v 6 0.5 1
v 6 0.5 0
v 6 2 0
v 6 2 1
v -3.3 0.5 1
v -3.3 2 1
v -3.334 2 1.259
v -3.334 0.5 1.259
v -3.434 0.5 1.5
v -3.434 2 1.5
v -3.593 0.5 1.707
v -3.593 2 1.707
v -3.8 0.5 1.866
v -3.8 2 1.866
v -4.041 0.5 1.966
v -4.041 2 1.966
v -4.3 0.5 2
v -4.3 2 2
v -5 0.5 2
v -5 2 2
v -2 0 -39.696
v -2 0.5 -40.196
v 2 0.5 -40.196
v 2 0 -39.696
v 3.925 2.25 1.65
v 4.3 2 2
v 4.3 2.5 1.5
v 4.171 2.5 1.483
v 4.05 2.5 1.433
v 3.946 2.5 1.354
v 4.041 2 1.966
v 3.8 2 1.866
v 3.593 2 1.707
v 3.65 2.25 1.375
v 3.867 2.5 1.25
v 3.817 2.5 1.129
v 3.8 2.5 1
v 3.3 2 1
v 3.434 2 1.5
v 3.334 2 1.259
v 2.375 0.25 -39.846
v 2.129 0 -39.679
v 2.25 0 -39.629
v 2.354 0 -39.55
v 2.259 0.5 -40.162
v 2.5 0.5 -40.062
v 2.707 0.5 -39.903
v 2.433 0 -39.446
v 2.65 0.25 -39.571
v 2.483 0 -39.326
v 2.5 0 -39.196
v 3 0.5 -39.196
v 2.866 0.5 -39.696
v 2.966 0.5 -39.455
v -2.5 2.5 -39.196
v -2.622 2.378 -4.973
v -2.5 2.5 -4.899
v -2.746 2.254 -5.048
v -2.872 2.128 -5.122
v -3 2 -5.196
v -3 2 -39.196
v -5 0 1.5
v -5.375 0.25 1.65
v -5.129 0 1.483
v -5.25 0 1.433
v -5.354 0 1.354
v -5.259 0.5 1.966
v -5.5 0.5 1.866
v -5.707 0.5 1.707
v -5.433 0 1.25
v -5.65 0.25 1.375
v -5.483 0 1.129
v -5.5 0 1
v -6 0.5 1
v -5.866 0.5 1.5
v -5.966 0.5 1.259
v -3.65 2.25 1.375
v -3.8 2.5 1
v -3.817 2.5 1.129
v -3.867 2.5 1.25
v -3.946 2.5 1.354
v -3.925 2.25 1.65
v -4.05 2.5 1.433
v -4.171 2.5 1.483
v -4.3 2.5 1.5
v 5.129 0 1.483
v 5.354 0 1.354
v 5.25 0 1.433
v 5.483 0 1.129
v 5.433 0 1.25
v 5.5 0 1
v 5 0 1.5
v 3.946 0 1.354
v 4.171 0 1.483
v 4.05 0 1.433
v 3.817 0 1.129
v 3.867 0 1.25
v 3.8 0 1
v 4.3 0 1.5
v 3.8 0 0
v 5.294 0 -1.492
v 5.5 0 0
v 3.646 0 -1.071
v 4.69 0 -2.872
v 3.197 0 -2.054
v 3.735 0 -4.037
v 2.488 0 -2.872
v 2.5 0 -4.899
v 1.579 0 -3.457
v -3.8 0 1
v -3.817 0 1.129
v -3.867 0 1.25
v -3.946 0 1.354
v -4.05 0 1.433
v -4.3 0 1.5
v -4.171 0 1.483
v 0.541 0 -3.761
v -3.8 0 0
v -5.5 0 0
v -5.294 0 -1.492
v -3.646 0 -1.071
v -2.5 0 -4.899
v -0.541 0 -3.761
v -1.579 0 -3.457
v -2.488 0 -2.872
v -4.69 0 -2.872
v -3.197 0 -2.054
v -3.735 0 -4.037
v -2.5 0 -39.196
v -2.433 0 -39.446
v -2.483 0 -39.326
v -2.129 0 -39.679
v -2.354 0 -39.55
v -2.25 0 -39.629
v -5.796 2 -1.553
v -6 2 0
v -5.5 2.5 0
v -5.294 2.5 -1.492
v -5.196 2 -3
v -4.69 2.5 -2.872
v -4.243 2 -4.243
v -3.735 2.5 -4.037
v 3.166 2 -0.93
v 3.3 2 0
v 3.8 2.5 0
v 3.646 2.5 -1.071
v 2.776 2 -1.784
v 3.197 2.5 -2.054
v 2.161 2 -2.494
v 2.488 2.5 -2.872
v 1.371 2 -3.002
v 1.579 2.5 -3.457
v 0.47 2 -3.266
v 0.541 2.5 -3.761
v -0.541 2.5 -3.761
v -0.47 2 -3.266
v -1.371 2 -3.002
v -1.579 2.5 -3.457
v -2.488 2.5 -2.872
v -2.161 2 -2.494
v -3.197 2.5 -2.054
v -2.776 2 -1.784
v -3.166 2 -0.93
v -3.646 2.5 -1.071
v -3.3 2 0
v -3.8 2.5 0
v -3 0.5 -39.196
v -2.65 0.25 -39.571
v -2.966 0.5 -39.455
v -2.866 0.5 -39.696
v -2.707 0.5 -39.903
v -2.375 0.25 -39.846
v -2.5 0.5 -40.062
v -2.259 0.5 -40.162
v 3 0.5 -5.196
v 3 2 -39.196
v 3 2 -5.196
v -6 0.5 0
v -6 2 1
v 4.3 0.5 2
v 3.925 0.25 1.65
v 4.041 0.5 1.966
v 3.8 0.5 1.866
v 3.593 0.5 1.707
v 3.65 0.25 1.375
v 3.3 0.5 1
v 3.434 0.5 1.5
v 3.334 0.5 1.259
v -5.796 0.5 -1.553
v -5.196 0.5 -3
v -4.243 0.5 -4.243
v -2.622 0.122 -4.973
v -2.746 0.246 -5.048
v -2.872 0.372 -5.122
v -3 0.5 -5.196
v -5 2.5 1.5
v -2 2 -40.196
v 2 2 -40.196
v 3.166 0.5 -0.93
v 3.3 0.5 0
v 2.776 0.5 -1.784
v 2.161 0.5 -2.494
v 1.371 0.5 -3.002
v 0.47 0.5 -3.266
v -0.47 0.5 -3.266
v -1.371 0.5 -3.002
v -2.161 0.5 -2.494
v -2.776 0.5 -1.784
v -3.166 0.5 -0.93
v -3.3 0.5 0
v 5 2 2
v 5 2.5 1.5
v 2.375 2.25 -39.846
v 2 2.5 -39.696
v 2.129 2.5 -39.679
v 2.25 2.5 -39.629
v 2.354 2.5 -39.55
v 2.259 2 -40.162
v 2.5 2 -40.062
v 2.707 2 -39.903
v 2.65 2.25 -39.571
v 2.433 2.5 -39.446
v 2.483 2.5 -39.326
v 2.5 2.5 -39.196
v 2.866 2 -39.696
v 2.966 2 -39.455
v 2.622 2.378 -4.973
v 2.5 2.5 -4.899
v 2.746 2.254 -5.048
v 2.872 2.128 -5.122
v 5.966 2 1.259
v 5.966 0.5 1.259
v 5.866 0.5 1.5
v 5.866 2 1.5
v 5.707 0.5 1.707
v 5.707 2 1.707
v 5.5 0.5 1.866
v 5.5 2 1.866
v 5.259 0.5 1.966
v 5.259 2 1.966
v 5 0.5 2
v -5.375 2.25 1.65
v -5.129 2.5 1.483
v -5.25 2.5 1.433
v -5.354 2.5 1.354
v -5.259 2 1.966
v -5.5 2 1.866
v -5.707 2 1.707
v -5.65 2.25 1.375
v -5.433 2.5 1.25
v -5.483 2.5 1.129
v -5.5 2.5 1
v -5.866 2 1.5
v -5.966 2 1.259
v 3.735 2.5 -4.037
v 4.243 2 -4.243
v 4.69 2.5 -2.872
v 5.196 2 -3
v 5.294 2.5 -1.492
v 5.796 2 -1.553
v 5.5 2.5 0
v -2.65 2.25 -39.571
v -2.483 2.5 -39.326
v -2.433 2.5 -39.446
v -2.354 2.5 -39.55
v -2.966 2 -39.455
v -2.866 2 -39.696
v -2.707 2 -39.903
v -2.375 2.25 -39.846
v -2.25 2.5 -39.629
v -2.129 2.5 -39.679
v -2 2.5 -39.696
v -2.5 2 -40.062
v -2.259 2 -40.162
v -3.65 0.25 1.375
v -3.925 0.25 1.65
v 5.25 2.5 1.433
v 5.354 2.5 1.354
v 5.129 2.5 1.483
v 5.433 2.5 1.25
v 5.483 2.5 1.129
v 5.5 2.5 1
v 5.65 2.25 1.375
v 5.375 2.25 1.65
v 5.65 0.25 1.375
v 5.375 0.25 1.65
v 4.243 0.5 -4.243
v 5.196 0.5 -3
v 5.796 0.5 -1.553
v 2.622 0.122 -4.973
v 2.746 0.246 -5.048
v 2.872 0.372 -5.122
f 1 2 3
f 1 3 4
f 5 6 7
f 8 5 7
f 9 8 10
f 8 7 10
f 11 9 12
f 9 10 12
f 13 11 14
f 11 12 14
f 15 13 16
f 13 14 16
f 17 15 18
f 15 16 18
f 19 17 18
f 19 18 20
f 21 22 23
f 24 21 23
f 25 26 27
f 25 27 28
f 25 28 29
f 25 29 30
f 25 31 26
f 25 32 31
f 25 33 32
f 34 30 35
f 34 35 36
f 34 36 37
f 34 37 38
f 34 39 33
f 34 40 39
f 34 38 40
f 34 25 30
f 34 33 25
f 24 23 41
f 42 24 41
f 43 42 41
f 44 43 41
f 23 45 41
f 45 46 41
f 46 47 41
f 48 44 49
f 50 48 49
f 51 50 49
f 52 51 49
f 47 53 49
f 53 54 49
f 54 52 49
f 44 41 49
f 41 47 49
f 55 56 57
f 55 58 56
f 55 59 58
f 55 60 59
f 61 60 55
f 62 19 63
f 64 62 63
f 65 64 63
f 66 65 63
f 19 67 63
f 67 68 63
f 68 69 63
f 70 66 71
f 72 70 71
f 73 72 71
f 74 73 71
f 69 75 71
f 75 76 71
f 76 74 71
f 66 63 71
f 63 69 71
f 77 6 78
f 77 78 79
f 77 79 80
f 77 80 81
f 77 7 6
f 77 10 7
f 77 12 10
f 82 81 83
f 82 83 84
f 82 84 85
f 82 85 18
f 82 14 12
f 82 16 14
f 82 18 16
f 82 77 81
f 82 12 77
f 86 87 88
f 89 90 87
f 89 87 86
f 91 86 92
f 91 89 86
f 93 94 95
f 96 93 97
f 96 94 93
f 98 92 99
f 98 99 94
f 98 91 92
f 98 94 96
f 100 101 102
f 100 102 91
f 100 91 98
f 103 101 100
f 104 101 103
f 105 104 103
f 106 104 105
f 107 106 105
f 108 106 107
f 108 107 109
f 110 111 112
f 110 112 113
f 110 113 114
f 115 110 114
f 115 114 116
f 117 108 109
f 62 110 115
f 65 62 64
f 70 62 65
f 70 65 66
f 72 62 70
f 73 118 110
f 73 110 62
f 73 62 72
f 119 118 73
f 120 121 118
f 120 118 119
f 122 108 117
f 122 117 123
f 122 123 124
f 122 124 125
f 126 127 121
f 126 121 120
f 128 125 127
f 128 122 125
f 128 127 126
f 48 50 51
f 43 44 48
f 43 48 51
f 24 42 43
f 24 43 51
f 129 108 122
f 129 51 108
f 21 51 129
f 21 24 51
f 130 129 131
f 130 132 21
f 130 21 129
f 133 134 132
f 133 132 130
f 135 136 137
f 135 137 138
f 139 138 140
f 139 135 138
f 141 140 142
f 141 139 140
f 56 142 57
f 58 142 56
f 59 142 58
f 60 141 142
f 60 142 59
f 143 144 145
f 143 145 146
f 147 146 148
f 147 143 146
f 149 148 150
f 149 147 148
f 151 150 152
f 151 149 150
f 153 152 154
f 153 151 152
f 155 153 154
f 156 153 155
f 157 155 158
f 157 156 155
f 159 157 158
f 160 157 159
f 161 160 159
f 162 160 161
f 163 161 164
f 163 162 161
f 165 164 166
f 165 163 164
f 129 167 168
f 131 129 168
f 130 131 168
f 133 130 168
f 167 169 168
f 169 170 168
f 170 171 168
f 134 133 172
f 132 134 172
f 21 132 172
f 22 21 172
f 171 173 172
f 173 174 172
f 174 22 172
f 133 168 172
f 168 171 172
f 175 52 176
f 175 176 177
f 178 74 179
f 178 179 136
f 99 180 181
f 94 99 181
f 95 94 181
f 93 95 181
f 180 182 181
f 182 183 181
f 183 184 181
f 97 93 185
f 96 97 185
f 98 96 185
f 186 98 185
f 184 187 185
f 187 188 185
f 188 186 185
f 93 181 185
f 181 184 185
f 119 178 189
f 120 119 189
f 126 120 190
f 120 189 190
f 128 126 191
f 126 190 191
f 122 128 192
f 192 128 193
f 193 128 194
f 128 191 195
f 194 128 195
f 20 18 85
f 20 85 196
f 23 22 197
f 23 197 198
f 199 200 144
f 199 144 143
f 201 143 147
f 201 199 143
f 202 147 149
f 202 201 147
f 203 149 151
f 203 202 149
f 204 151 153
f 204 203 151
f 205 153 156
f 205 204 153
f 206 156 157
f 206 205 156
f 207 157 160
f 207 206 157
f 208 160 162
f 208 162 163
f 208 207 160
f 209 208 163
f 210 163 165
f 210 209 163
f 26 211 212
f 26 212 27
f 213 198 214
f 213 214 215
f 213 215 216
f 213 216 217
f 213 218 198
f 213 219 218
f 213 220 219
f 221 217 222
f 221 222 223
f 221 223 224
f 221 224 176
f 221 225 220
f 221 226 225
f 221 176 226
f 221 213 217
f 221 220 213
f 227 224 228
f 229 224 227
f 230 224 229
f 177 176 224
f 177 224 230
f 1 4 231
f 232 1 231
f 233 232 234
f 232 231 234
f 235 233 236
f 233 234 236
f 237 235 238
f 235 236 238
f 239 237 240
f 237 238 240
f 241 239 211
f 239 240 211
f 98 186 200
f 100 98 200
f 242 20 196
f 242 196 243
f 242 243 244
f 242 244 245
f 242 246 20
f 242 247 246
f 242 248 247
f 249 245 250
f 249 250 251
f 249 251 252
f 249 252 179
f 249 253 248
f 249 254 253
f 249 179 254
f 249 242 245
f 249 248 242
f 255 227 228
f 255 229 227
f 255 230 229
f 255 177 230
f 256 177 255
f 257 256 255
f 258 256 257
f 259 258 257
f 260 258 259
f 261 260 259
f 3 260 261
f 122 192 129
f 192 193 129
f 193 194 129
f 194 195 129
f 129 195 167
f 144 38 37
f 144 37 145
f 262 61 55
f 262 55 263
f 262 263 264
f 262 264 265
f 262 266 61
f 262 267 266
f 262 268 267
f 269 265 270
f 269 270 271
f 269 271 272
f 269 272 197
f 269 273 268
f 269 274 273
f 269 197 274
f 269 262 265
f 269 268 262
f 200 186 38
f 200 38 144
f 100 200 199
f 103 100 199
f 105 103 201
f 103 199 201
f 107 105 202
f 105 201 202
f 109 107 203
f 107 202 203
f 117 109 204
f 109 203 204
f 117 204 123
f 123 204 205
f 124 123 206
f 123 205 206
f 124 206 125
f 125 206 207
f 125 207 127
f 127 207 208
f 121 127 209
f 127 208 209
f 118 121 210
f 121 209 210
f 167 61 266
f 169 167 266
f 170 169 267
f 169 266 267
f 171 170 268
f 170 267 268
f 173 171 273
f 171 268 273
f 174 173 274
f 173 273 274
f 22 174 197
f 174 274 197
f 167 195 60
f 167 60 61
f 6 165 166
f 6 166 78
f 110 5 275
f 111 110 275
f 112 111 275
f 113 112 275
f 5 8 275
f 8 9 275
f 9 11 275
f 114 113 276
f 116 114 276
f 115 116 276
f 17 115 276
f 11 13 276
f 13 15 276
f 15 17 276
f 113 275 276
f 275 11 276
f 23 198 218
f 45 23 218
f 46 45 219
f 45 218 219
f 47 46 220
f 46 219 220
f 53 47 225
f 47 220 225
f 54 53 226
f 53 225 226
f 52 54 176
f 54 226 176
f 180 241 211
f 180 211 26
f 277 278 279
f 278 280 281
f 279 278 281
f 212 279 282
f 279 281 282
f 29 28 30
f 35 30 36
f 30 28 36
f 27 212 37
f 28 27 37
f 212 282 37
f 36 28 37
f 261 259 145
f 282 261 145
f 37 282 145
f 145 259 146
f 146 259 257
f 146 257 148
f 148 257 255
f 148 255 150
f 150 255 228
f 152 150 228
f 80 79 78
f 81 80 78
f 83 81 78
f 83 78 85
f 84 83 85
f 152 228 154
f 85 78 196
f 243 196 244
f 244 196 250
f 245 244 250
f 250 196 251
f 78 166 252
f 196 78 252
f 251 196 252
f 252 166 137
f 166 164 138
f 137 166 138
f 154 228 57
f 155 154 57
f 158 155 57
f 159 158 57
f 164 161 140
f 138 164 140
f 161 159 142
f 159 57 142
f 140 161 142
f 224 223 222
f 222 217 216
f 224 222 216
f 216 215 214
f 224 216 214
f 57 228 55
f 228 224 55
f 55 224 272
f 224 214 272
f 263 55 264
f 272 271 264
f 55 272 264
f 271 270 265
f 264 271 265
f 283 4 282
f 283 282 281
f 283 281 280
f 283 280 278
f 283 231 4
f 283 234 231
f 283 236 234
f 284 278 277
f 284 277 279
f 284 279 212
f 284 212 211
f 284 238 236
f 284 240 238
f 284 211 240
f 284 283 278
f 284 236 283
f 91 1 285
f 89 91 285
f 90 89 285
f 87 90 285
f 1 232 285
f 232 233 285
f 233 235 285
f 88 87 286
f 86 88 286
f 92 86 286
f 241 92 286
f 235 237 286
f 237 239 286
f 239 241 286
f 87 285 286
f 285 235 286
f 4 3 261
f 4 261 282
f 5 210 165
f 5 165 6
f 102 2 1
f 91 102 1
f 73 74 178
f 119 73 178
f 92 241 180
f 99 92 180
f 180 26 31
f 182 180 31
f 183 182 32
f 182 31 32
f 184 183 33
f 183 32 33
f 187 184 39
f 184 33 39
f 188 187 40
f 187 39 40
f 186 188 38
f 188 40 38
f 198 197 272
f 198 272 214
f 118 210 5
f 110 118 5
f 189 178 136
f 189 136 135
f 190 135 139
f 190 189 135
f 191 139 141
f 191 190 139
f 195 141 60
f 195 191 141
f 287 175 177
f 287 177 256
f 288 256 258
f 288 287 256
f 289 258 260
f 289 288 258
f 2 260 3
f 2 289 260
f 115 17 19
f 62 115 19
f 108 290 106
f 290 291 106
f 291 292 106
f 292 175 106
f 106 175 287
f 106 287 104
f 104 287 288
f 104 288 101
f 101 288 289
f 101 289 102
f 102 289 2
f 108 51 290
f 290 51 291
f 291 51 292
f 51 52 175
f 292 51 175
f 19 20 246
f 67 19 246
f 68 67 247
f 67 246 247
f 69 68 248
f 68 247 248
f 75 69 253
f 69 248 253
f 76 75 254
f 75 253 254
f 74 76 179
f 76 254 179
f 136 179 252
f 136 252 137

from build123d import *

# Parameters (mm, degrees)
BOSS_EXTRUDE1_DEPTH = 2.5
FILLET1_R           = 1
CHAMFER1_SIZE       = 0.5


with BuildPart() as part:
    # Sketch1 → Boss-Extrude1 (new body)
    with BuildSketch(Plane(origin=(0, 0, 0), x_dir=(1, 0, 0), z_dir=(0, 1, 0))):
        with BuildLine():
            Line((-3.3, 0), (-3.3, -2))
            Line((-3.3, -2), (-6, -2))
            Line((-6, -2), (-6, 0))
            ThreePointArc((-6, 0), (-5.196152423, 3), (-3, 5.196152423))
            Line((-3, 5.196152423), (-3, 40.196152423))
            Line((-3, 40.196152423), (3, 40.196152423))
            Line((3, 40.196152423), (3, 5.196152423))
            ThreePointArc((3, 5.196152423), (5.196152423, 3), (6, 0))
            Line((6, 0), (6, -2))
            Line((6, -2), (3.3, -2))
            Line((3.3, -2), (3.3, 0))
            ThreePointArc((3.3, 0), (0, 3.3), (-3.3, 0))
        make_face()
    extrude(amount=BOSS_EXTRUDE1_DEPTH)

    # Fillet1
    fillet1_edges = [part.edges().sort_by_distance(p)[0] for p in [
        (-3.3, 1.25, 2),
        (-6, 1.25, 2),
        (-3, 1.25, -40.196152423),
        (3, 1.25, -40.196152423),
        (6, 1.25, 2),
        (3.3, 1.25, 2),
    ]]
    fillet(fillet1_edges, radius=FILLET1_R)

    # Chamfer1
    chamfer1_edges = [part.edges().sort_by_distance(p)[0] for p in [
        (-6, 0, 0.5),
        (-5.196152423, 0, -3),
        (3, 0, -22.196152423),
        (5.196152423, 0, -3),
        (3.3, 0, 0.5),
        (0, 0, -3.3),
        (5.196152423, 2.5, -3),
        (3, 2.5, -22.196152423),
        (-3, 0, -22.196152423),
        (-3, 2.5, -22.196152423),
        (-5.196152423, 2.5, -3),
        (-3.3, 0, 0.5),
        (-4.65, 0, 2),
        (0, 0, -40.196152423),
        (6, 0, 0.5),
        (4.65, 0, 2),
        (-6, 2.5, 0.5),
        (-5.707106781, 0, 1.707106781),
        (-3.592893219, 0, 1.707106781),
        (3.592893219, 0, 1.707106781),
        (5.707106781, 0, 1.707106781),
        (2.707106781, 0, -39.903259204),
        (-2.707106781, 0, -39.903259204),
        (0, 2.5, -40.196152423),
        (4.65, 2.5, 2),
        (6, 2.5, 0.5),
        (-4.65, 2.5, 2),
        (-3.3, 2.5, 0.5),
        (-5.707106781, 2.5, 1.707106781),
        (-3.592893219, 2.5, 1.707106781),
        (0, 2.5, -3.3),
        (3.592893219, 2.5, 1.707106781),
        (5.707106781, 2.5, 1.707106781),
        (2.707106781, 2.5, -39.903259204),
        (-2.707106781, 2.5, -39.903259204),
        (3.3, 2.5, 0.5),
    ]]
    chamfer(chamfer1_edges, length=CHAMFER1_SIZE)


solid = part.part
